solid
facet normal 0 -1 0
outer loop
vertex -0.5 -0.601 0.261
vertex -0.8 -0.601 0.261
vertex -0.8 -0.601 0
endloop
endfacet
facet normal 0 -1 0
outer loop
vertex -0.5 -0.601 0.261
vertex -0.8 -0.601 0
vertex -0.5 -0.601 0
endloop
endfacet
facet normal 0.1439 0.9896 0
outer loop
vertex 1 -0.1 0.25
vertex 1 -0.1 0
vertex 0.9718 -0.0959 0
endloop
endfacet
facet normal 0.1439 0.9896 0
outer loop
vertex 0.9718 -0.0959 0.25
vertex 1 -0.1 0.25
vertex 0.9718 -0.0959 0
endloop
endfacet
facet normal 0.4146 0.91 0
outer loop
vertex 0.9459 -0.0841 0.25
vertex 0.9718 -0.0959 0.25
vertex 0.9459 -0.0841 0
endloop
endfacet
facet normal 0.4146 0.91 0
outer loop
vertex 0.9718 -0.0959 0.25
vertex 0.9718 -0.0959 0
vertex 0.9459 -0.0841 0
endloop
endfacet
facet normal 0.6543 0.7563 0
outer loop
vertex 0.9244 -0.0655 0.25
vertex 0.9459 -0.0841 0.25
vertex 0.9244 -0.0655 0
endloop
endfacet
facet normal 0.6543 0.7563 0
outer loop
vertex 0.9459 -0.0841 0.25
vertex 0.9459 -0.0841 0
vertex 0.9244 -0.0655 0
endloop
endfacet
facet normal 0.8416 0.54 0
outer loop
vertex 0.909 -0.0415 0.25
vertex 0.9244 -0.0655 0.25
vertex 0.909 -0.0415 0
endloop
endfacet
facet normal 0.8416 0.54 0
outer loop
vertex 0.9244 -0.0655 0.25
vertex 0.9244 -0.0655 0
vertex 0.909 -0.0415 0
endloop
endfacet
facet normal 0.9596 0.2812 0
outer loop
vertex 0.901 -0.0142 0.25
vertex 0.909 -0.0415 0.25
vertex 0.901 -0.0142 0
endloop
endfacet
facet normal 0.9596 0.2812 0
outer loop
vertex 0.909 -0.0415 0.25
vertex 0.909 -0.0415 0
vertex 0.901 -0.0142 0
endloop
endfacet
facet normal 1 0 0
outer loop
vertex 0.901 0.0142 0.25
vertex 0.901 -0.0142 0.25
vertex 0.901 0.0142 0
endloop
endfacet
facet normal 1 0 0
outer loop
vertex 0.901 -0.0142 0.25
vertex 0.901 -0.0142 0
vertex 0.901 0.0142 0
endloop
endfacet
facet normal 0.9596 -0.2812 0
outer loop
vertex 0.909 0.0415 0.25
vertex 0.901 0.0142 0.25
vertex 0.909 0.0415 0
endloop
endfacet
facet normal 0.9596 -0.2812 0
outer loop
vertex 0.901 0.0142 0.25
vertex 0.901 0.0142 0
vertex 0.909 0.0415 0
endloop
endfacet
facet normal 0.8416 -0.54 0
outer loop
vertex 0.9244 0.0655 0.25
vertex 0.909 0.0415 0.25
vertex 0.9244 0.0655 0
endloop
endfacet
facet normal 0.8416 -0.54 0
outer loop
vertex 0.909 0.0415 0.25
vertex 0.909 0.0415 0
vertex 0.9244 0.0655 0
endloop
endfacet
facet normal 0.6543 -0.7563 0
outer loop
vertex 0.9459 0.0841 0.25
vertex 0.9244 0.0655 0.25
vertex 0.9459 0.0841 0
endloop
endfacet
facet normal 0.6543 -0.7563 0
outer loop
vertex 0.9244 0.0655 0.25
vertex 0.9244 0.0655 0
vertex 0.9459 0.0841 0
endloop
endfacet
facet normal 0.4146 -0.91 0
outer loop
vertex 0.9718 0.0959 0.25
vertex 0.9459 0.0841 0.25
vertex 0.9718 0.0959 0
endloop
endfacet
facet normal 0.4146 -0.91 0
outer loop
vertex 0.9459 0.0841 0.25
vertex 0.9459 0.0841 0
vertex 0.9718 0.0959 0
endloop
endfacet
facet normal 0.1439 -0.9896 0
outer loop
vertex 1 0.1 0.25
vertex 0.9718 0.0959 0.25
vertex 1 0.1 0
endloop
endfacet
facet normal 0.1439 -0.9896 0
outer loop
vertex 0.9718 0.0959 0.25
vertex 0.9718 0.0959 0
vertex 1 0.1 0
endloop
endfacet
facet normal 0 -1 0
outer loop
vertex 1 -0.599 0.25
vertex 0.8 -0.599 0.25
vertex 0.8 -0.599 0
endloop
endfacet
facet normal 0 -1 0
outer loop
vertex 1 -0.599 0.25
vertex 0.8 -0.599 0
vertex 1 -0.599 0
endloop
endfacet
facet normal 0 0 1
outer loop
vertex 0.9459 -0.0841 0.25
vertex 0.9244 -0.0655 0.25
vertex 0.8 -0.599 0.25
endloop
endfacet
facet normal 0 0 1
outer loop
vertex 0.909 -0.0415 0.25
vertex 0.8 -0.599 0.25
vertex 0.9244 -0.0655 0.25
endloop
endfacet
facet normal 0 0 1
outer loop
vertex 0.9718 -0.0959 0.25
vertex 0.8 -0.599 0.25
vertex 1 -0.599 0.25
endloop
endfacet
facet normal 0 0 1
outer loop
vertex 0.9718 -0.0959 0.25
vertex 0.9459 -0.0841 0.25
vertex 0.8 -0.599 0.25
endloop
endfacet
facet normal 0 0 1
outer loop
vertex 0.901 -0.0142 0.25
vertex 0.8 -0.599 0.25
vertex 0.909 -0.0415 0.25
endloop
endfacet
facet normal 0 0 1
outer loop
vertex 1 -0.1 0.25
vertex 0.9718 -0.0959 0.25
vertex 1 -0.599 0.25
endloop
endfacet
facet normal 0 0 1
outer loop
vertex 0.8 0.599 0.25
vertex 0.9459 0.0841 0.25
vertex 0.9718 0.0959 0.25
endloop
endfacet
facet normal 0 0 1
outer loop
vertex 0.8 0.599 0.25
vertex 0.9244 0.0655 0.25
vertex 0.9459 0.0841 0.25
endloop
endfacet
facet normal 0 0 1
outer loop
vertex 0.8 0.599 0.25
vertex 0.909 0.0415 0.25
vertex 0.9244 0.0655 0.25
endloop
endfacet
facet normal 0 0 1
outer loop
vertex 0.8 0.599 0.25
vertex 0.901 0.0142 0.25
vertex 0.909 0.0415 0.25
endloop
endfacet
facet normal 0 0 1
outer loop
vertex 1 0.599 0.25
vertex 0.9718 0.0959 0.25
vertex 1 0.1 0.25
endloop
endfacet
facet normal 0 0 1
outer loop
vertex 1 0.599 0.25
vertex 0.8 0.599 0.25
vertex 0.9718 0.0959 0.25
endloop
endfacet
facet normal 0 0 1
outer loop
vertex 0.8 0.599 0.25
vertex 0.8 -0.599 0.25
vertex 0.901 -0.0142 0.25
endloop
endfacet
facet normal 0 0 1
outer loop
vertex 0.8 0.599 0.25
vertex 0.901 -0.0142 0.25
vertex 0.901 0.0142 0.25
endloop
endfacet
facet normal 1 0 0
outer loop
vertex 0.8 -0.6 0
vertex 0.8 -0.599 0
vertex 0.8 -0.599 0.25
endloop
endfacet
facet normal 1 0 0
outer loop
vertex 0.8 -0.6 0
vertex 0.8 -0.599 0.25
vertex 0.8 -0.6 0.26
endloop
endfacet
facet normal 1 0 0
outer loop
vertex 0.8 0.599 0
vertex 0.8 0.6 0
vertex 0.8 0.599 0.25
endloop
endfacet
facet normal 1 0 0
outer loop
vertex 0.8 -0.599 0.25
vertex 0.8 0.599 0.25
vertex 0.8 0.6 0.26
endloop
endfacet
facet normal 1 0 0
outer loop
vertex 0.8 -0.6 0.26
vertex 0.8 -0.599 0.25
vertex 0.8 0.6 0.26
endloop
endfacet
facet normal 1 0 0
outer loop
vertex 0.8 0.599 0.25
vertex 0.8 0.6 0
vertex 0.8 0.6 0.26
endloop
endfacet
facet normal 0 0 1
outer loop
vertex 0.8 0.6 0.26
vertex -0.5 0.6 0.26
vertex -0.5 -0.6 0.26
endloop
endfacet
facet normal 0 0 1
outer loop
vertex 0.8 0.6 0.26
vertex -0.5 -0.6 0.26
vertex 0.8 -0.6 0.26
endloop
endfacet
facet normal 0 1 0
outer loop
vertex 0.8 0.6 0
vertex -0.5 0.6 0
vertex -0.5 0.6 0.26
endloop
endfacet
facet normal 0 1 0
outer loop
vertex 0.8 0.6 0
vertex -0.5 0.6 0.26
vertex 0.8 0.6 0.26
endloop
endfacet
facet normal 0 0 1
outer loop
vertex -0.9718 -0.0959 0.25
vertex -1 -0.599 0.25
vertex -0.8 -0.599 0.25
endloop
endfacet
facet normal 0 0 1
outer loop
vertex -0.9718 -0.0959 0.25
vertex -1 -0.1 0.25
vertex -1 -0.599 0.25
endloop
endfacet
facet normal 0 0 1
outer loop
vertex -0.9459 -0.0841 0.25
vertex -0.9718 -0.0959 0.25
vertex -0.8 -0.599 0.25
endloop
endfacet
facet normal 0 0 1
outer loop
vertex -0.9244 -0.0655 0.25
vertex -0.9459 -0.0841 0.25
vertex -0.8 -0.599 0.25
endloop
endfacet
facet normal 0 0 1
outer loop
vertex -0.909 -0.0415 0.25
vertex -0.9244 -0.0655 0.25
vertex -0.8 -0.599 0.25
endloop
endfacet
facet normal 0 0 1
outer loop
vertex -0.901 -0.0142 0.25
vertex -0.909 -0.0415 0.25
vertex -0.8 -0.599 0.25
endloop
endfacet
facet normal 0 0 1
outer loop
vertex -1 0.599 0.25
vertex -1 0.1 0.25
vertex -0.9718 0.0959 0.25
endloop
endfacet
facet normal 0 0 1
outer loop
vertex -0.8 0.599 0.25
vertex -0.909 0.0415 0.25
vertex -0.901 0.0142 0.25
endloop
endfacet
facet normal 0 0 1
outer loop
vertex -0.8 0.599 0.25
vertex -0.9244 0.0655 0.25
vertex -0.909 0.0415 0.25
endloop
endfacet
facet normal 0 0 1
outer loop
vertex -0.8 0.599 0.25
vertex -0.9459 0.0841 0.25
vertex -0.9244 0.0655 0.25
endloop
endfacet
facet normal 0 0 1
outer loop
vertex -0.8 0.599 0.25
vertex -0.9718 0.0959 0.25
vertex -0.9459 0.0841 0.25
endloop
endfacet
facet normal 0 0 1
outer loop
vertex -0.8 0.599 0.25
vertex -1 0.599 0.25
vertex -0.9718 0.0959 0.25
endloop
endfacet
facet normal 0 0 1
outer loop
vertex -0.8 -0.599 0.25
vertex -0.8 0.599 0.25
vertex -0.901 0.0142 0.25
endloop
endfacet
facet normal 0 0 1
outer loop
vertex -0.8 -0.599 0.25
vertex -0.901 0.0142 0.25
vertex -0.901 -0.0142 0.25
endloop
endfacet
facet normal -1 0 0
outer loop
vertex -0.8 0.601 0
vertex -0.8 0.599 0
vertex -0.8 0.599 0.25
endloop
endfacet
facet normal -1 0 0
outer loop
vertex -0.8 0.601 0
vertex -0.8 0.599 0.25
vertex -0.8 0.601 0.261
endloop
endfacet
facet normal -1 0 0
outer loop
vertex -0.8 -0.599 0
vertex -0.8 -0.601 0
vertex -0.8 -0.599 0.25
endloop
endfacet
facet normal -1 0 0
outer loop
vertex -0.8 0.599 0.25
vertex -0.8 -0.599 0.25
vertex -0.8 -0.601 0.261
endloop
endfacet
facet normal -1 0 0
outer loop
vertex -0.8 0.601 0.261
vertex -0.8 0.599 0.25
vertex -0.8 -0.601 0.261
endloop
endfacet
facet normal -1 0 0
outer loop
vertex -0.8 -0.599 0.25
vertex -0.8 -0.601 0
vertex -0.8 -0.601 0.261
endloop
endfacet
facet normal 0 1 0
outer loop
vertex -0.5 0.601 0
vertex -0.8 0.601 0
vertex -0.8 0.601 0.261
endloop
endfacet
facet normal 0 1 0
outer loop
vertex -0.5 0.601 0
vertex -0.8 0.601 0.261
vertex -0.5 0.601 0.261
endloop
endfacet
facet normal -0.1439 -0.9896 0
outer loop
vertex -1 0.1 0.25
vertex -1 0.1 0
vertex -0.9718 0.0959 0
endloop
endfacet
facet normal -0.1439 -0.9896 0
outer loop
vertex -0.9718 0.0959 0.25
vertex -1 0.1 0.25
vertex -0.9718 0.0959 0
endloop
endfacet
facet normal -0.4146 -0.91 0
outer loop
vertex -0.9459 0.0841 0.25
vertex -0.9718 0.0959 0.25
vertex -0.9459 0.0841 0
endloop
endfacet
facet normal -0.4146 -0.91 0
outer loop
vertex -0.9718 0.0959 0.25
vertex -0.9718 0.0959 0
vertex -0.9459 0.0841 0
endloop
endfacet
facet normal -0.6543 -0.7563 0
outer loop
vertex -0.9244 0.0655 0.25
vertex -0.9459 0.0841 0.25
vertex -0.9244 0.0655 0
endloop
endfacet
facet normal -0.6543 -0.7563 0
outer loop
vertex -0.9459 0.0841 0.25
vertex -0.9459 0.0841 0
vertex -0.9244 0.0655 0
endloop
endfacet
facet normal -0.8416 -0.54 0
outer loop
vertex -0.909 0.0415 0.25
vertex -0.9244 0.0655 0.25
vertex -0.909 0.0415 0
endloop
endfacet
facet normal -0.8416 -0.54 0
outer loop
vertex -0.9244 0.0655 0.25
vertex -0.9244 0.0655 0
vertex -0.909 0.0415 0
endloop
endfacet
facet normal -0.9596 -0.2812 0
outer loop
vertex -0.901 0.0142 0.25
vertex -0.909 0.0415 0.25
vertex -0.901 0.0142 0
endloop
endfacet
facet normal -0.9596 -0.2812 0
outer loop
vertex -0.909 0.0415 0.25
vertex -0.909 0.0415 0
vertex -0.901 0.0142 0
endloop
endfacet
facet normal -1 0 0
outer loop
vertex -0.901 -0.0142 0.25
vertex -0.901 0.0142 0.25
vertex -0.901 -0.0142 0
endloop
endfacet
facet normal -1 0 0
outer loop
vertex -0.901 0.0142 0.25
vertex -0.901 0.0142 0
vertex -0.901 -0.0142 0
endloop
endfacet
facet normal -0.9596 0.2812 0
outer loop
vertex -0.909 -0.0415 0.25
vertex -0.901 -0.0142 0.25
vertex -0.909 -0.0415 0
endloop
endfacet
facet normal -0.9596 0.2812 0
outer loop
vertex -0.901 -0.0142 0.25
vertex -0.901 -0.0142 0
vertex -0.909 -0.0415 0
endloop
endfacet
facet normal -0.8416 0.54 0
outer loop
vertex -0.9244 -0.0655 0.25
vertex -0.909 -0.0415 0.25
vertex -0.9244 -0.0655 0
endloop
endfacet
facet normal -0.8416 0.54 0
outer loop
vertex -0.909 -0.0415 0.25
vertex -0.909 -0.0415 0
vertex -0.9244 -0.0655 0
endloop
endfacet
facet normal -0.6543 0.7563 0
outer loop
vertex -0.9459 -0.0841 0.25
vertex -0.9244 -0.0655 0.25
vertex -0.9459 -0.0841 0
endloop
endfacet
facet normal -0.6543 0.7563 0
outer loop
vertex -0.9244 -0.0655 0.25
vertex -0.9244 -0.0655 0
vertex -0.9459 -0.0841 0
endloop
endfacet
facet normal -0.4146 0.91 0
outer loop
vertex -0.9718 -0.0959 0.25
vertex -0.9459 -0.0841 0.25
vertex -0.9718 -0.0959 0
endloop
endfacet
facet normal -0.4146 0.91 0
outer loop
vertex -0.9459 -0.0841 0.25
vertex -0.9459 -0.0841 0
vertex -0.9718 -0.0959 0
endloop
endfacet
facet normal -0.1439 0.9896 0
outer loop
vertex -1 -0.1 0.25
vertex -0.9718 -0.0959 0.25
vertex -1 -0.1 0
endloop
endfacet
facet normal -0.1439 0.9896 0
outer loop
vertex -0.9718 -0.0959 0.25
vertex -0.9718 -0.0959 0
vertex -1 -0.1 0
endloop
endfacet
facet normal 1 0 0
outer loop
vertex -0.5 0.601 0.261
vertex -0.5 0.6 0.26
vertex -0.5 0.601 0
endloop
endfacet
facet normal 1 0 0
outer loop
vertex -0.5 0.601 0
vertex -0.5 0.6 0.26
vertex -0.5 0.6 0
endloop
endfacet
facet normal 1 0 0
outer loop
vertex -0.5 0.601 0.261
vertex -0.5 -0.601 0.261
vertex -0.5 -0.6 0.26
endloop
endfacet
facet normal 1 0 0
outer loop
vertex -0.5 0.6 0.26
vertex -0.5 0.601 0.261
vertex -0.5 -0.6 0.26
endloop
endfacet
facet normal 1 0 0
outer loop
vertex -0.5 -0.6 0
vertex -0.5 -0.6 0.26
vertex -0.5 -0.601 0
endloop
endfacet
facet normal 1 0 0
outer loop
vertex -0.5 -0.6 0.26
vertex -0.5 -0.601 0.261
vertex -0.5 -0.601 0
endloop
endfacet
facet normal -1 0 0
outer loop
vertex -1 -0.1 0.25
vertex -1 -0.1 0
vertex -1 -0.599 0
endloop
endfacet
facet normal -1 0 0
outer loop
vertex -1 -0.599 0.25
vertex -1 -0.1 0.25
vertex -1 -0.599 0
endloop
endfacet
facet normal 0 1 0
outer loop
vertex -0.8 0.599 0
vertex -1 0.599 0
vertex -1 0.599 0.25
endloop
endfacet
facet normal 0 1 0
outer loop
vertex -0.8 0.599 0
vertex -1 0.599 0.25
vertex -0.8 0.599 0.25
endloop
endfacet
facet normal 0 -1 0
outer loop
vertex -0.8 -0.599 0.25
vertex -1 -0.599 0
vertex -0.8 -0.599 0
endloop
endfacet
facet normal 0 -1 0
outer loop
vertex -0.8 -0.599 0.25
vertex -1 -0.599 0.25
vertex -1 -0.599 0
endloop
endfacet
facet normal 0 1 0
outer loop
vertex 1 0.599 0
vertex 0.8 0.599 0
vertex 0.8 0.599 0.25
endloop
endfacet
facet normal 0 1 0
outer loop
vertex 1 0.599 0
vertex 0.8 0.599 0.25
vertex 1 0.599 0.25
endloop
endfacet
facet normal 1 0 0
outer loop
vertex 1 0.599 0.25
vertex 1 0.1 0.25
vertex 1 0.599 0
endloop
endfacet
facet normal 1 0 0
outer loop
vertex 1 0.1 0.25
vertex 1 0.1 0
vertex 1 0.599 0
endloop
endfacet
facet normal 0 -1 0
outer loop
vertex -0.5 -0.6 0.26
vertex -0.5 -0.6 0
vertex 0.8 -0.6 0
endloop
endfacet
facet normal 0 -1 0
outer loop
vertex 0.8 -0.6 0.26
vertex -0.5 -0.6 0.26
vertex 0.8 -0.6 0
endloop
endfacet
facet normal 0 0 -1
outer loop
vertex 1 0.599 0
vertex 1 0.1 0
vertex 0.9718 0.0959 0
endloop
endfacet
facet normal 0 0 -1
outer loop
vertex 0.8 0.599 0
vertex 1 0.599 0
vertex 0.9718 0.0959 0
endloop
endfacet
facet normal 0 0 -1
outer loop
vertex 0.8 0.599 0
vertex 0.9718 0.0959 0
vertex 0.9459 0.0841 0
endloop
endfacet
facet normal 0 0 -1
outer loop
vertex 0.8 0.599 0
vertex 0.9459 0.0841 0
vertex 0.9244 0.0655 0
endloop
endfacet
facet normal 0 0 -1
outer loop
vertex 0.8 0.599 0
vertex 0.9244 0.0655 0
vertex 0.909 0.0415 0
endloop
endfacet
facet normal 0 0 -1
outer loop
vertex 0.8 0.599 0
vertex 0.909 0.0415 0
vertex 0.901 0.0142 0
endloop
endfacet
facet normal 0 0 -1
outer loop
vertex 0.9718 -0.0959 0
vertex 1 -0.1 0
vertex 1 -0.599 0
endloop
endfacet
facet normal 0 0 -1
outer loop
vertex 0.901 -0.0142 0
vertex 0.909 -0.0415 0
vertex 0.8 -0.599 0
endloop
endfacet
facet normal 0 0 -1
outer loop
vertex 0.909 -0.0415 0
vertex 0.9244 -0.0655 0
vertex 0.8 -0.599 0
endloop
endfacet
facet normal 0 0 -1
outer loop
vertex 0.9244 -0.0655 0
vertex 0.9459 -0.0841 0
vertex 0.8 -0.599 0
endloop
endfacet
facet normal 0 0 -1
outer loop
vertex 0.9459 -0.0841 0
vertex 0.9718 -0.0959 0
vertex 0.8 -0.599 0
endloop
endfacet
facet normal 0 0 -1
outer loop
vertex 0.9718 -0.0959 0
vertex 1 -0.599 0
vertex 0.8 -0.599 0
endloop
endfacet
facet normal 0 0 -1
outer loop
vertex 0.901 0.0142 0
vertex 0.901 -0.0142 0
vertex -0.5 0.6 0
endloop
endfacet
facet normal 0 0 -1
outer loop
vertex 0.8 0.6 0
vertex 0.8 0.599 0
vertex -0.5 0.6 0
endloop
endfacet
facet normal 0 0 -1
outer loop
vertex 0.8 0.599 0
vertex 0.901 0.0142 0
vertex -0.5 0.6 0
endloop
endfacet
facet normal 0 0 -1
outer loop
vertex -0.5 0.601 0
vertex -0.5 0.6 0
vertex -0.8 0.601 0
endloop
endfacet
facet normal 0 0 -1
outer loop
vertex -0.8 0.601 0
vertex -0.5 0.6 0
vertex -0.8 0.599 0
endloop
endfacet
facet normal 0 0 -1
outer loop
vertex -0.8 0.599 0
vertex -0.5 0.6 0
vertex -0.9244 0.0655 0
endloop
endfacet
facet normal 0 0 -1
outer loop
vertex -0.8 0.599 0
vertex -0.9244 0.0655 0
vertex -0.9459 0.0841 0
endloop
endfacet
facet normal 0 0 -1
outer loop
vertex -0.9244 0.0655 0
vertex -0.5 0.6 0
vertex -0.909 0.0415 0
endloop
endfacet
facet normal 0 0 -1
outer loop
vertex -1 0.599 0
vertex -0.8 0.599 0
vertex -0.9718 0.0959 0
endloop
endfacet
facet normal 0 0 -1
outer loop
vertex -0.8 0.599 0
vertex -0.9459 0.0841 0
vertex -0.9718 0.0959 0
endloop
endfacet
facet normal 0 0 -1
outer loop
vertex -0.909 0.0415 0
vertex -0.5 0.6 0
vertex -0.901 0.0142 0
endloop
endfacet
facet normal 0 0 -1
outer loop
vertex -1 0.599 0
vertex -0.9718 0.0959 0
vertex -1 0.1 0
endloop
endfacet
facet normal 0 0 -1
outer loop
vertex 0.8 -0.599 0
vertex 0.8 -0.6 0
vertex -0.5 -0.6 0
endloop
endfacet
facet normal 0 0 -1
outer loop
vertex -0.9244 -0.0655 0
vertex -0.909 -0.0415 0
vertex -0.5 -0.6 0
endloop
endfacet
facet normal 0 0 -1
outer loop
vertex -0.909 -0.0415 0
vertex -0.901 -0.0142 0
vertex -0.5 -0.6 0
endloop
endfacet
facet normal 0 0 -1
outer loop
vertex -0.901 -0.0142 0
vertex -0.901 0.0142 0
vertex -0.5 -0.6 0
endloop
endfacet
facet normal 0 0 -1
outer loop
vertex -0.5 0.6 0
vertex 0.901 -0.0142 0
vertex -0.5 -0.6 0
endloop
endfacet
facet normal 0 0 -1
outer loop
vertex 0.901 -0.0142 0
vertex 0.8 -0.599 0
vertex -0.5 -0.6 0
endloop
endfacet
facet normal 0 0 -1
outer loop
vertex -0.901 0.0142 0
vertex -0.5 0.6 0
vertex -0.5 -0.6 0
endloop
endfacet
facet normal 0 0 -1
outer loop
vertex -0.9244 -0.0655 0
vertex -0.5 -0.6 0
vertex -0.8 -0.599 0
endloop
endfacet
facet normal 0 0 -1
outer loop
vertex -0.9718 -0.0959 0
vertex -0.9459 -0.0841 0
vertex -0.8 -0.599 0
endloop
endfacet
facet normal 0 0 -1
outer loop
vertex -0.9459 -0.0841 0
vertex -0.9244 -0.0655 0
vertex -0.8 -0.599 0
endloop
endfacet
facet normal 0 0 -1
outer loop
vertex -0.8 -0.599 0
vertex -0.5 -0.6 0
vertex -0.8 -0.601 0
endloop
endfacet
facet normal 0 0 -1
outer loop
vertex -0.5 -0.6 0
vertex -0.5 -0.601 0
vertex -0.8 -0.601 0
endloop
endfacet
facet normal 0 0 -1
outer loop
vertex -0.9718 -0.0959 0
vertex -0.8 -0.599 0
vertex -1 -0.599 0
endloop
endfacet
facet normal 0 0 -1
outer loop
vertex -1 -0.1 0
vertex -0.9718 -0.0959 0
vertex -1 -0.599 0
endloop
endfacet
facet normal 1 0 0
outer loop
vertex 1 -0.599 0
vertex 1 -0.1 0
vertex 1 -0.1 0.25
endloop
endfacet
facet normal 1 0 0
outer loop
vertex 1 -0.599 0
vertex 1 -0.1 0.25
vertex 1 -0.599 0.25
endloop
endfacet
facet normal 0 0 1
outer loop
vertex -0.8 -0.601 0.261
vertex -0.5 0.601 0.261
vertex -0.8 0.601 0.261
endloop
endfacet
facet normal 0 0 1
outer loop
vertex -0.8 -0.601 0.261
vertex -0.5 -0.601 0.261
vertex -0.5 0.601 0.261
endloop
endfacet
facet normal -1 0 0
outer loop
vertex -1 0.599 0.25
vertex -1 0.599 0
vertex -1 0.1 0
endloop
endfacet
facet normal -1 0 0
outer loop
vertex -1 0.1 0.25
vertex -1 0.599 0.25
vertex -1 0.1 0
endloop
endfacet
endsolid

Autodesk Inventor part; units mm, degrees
ref_plane "YZ Plane" through (0, 0, 0) normal (1, 0, 0) x (0, 1, 0)
ref_plane "XZ Plane" through (0, 0, 0) normal (0, 1, 0) x (-1, 0, 0)
ref_plane "XY Plane" through (0, 0, 0) normal (0, 0, 1) x (1, 0, 0)
sketch "Schizzo1" plane through (0, 0, 0) normal (0, 0, 1) x (1, 0, 0)
  line L0 (-1, 0.6) -> (1, 0.6)
  line L1 (1, 0.6) -> (1, -0.6) construction
  line L2 (1, -0.6) -> (-1, -0.6)
  line L3 (-1, -0.6) -> (-1, 0.6) construction
  arc A0 (-1, -0.1) -> (-1, 0.1) centre (-1, 0) ccw
  line L4 (-1, 0.6) -> (-1, 0.1)
  line L5 (-1, -0.1) -> (-1, -0.6)
  arc A1 (1, 0.1) -> (1, -0.1) centre (1, 0) ccw
  line L6 (1, -0.1) -> (1, -0.6)
  line L7 (1, 0.1) -> (1, 0.6)
  line L8 (-0.8, 0.6) -> (0.8, 0.6)
  line L9 (0.8, 0.6) -> (0.8, -0.6)
  line L10 (0.8, -0.6) -> (-0.8, -0.6)
  line L11 (-0.8, -0.6) -> (-0.8, 0.6)
  point P0 (0, 0)
  dimension "d0" = 2
  dimension "d1" = 1.2
  dimension "d2" = 1
  dimension "d3" = 0.6
  dimension "d4" = 0.1
  dimension "d5" = 0.6
  dimension "d6" = 0.1
  dimension "d7" = 0.2
  dimension "d8" = 0.2
extrude "Estrusione1" add sketch "Schizzo1" along normal blind 0.25
sketch "Schizzo2" plane through (0, 0, 0.25) normal (0, 0, 1) x (1, 0, 0)
  line L0 (1, 0.6) -> (-1, 0.6) projected
  line L1 (-1, -0.6) -> (1, -0.6) projected
  line L2 (-0.8, 0.6) -> (0.8, 0.6)
  line L3 (0.8, 0.6) -> (0.8, -0.6)
  line L4 (0.8, -0.6) -> (-0.8, -0.6)
  line L5 (-0.8, -0.6) -> (-0.8, 0.6)
  line L6 (1, 0.1) -> (1, 0.6) projected
  line L7 (-1, 0.6) -> (-1, 0.1) projected
  point P0 (0, 0)
  dimension "d11" = 0.2
  dimension "d12" = 0.2
extrude "Estrusione2" add sketch "Schizzo2" along normal blind 0.01
sketch "Schizzo3" plane through (0, 0, 0.26) normal (0, 0, 1) x (1, 0, 0)
  line L0 (-0.8, -0.6) -> (-0.8, 0.6) projected
  line L1 (-1, -0.6) -> (1, -0.6) projected
  line L2 (-0.8, 0.6) -> (-0.5, 0.6)
  line L3 (-0.5, 0.6) -> (-0.5, -0.6)
  line L4 (-0.5, -0.6) -> (-0.8, -0.6)
  line L5 (-0.8, -0.6) -> (-0.8, 0.6)
  point P0 (0, 0)
  dimension "d15" = 0.3
extrude "Estrusione3" add sketch "Schizzo3" along normal blind 0.001
sketch "Schizzo4" plane through (-1, 0.6, 0) normal (0, 1, 0) x (1, 0, 0)
  line L0 (1.8, -0.25) -> (1.8, -0.26) projected
  line L1 (2, 0) -> (0, 0) projected
  line L2 (1.8, -0.25) -> (2, -0.25)
  line L3 (2, -0.25) -> (2, 0)
  line L4 (2, 0) -> (1.8, 0)
  line L5 (1.8, 0) -> (1.8, -0.25)
  line L6 (0, 0) -> (0.2, 0)
  line L7 (0.2, 0) -> (0.2, -0.25)
  line L8 (0.2, -0.25) -> (0, -0.25)
  line L9 (0, -0.25) -> (0, 0)
  point P0 (1, 0)
extrude "Estrusione4" cut sketch "Schizzo4" against normal blind 0.001
sketch "Schizzo5" plane through (-1, -0.6, 0) normal (0, -1, 0) x (1, 0, 0)
  line L0 (0.2, 0.25) -> (0.2, 0.261) projected
  line L1 (0.2, 0.25) -> (0, 0.25)
  line L2 (0, 0.25) -> (0, 0)
  line L3 (0, 0) -> (0.2, 0)
  line L4 (0.2, 0) -> (0.2, 0.25)
  line L5 (1.8, 0.25) -> (2, 0.25) projected
  line L6 (0, 0) -> (2, 0) projected
  line L7 (1.8, 0.25) -> (2, 0.25)
  line L8 (2, 0.25) -> (2, 0)
  line L9 (2, 0) -> (1.8, 0)
  line L10 (1.8, 0) -> (1.8, 0.25)
  point P0 (1, 0)
extrude "Estrusione5" cut sketch "Schizzo5" against normal blind 0.001
sketch "Schizzo7" plane through (-0.8, -0.6, 0) normal (0, -1, 0) x (1, 0, 0)
  line L0 (0.3, 0.261) -> (0, 0.261) projected
  line L1 (0, 0.261) -> (0, 0) projected
  line L2 (0.3, 0.261) -> (0, 0.261)
  line L3 (0, 0.261) -> (0, 0)
  line L4 (0, 0) -> (0.3, 0)
  line L5 (0.3, 0) -> (0.3, 0.261)
  point P0 (0.8, 0)
extrude "Estrusione6" add sketch "Schizzo7" along normal blind 0.001
sketch "Schizzo8" plane through (-0.8, 0.6, 0) normal (0, 1, 0) x (1, 0, 0)
  line L0 (0.3, -0.261) -> (0, -0.261) projected
  line L1 (0, -0.261) -> (0.3, -0.261)
  line L2 (0.3, -0.261) -> (0.3, 0)
  line L3 (0.3, 0) -> (0, 0)
  line L4 (0, 0) -> (0, -0.261)
  line L5 (0.3, -0.26) -> (0.3, -0.261) projected
  point P0 (0.8, 0)
extrude "Estrusione7" add sketch "Schizzo8" along normal blind 0.001
properties part number "fuse"
